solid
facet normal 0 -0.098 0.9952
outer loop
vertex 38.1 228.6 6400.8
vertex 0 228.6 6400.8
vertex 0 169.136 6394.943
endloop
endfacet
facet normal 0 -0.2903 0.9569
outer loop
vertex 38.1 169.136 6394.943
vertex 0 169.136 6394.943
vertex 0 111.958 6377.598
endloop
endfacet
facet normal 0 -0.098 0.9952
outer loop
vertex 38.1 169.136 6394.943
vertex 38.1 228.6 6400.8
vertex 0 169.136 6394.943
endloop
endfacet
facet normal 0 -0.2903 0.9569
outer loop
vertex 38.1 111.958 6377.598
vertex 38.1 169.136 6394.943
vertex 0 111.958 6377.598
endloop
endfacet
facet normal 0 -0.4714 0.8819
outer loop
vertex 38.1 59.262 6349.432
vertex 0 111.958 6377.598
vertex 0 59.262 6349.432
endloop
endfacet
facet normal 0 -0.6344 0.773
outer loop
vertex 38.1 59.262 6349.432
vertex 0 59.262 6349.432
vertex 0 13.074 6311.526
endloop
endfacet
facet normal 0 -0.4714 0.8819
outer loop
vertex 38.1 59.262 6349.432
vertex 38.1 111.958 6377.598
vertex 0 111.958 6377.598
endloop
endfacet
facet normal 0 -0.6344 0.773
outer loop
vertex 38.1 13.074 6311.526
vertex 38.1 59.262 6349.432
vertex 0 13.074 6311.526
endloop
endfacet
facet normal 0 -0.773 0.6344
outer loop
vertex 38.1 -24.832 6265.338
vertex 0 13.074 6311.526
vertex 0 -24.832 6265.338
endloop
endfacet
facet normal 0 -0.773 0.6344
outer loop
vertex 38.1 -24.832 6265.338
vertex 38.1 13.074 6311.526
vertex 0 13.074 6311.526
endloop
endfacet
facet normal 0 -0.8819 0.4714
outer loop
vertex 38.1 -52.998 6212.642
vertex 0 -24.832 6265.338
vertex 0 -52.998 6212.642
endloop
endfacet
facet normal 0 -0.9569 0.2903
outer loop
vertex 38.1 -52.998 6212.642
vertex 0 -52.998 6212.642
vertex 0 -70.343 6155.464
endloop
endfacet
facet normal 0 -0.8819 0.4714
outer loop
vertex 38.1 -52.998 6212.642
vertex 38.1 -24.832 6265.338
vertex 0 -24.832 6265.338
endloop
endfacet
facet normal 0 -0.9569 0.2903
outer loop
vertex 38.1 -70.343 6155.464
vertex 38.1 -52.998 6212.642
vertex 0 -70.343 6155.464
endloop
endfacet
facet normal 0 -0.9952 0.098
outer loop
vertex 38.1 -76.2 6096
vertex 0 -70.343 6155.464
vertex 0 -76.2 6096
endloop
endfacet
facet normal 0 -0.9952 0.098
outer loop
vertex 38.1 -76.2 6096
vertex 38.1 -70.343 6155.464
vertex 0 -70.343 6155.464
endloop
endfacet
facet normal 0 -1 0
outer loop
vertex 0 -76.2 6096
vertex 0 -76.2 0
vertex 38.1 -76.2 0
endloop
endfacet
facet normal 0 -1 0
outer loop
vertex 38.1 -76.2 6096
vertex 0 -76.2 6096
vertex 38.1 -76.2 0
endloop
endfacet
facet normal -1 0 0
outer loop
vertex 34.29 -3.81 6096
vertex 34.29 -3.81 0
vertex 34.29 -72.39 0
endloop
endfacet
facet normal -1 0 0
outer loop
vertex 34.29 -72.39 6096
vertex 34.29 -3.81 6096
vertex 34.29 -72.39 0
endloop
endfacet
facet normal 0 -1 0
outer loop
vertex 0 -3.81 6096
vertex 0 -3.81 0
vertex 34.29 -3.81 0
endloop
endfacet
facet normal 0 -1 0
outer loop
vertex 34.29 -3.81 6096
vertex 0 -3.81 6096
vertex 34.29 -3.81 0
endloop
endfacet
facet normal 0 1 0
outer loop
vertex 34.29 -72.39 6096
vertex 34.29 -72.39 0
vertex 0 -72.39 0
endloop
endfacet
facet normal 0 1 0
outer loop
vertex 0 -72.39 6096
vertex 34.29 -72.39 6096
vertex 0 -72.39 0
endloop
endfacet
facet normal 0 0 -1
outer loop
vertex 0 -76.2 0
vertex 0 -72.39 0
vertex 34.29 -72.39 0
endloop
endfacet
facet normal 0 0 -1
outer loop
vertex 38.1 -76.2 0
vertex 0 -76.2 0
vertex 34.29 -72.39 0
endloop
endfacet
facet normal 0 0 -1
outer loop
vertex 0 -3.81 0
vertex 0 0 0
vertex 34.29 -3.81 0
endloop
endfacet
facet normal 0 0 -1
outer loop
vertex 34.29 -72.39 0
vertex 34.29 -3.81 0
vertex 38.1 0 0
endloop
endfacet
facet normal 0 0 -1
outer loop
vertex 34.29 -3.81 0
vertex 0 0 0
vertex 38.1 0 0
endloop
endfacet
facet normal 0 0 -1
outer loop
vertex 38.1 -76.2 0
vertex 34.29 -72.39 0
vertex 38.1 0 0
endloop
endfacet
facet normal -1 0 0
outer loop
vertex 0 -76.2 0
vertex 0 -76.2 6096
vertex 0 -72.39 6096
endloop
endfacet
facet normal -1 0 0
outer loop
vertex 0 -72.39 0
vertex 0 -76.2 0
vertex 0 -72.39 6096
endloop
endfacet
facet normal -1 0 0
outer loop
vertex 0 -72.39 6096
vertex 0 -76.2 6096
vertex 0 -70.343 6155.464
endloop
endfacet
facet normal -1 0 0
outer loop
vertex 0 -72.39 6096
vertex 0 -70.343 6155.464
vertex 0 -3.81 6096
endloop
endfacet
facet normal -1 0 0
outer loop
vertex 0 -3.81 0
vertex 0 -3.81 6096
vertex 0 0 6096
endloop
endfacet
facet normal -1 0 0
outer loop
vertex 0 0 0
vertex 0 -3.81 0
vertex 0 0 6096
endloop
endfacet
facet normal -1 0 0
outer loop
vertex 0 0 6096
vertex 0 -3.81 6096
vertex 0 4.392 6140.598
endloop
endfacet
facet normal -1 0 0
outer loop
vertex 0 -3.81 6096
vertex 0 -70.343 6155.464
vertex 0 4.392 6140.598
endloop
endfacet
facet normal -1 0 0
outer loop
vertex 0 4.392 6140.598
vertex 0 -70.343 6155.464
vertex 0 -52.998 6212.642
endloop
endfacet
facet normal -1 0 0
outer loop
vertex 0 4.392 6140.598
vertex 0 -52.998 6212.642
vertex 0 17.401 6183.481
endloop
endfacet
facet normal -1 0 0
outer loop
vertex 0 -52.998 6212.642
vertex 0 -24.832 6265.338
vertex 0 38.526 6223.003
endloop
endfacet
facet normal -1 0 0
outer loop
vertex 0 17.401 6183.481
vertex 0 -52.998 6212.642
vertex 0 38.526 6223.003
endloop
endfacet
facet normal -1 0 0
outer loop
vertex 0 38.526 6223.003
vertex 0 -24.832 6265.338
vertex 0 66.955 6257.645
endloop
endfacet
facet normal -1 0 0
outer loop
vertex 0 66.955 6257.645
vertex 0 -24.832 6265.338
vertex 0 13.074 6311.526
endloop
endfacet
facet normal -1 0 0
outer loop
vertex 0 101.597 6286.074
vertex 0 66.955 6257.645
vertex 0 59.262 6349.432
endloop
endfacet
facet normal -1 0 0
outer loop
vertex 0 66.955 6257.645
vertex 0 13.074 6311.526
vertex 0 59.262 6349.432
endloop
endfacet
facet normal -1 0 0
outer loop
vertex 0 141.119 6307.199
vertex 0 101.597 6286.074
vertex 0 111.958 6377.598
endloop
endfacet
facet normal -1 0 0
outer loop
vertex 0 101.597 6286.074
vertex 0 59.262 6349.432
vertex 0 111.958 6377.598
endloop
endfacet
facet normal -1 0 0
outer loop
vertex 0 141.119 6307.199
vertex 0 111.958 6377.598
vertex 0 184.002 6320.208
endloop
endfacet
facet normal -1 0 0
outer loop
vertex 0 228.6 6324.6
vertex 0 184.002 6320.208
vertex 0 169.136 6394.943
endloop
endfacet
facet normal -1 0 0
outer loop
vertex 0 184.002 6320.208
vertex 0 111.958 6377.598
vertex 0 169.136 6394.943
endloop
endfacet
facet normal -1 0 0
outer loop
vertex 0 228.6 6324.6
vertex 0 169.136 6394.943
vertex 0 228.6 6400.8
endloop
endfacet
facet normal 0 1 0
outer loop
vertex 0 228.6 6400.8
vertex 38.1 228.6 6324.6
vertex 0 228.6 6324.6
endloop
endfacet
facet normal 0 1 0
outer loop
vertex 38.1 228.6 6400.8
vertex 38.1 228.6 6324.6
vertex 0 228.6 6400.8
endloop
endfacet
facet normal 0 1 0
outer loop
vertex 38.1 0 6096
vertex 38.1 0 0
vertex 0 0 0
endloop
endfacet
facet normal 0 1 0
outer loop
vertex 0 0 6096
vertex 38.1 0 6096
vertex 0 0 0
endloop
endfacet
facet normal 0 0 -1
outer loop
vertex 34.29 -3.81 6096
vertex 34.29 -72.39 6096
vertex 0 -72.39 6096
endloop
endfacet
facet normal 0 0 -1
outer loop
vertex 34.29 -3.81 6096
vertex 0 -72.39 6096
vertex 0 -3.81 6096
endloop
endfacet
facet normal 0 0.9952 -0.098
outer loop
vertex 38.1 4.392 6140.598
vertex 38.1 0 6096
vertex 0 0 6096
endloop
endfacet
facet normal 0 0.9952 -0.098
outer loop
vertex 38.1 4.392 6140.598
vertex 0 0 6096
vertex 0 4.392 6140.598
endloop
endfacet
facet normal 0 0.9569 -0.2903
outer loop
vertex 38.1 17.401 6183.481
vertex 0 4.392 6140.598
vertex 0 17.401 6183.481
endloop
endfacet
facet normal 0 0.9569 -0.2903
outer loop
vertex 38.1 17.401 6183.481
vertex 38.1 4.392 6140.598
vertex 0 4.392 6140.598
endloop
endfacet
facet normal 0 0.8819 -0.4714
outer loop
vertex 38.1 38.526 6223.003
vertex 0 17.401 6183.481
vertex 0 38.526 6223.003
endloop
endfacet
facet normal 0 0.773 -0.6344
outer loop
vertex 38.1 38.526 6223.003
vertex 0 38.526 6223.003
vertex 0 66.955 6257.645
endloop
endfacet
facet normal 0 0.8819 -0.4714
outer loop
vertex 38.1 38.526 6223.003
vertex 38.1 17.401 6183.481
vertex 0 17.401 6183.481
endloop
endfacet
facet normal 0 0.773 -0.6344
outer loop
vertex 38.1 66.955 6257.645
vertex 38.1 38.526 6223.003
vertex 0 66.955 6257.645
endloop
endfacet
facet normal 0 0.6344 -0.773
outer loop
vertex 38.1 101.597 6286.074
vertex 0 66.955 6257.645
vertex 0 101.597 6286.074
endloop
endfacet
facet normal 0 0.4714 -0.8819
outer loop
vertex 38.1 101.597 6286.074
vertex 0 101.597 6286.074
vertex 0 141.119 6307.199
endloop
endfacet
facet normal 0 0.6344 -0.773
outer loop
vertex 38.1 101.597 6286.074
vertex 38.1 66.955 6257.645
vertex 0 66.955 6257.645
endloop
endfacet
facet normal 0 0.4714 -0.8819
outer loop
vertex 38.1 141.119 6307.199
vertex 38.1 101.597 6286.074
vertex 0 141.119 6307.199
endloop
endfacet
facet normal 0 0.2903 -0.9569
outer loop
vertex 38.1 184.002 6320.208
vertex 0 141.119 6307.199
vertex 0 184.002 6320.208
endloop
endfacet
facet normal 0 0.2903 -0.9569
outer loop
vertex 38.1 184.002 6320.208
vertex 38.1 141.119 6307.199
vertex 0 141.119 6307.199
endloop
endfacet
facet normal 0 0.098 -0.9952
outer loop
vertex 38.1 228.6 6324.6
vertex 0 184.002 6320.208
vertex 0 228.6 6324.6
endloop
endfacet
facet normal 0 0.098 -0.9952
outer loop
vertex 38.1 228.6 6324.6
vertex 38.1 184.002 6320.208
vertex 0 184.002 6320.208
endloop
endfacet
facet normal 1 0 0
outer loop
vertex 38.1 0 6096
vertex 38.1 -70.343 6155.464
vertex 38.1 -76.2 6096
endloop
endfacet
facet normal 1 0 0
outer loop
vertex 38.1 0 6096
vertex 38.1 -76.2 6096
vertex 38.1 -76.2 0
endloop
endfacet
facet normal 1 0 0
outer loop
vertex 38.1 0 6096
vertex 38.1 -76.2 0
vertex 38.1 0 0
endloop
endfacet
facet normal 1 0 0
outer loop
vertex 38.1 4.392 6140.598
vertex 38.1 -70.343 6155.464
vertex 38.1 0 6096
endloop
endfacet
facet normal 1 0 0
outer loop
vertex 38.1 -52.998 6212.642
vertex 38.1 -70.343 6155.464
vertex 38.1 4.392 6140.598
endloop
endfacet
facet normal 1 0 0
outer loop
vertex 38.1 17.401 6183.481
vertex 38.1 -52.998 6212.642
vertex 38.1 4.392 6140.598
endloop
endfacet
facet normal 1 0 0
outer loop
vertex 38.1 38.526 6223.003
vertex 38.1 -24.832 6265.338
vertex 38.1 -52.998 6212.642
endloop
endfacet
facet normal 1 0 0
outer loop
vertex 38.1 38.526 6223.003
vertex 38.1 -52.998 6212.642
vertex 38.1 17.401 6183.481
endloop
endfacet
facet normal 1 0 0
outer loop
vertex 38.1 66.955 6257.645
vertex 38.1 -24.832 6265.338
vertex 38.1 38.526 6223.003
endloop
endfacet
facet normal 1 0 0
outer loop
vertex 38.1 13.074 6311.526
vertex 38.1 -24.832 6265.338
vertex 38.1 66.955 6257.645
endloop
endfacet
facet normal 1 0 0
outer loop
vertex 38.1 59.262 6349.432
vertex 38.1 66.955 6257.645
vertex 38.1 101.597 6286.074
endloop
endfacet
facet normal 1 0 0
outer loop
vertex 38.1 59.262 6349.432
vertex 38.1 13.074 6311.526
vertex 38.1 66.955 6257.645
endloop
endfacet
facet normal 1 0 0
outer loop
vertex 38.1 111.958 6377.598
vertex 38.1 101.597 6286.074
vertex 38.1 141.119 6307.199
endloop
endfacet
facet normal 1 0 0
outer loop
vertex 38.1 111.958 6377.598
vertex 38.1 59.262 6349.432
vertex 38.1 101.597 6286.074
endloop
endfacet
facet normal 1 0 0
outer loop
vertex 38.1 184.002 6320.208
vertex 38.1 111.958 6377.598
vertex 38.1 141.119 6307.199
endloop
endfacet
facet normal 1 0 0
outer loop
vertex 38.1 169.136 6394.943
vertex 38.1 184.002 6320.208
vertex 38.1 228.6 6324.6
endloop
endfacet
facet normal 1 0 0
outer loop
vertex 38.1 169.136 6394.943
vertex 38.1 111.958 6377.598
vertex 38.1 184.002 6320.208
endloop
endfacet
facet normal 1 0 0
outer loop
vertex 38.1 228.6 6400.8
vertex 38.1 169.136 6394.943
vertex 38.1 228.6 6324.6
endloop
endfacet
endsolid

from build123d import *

# Parameters (mm, degrees)
F1_DEPTH = 6096
F3_DEPTH = 38.1


with BuildPart() as f1:
    # F0 (on Top) → F1 (new body)
    with BuildSketch(Plane.XY):
        Polygon((38.1, 0), (0, 0), (0, -3.81), (34.29, -3.81), (34.29, -72.39), (0, -72.39), (0, -76.2), (38.1, -76.2), align=None)
    extrude(amount=F1_DEPTH)

    # F2 (on face) → F3 (join)
    with BuildSketch(Plane.YZ.offset(38.1)):
        with BuildLine():
            ThreePointArc((228.6, 6400.8), (13.073853, 6311.526147), (-76.2, 6096))
            Line((-76.2, 6096), (0, 6096))
            ThreePointArc((0, 6096), (66.95539, 6257.64461), (228.6, 6324.6))
            Line((228.6, 6324.6), (228.6, 6400.8))
        make_face()
    extrude(amount=-F3_DEPTH)


solid = f1.part
